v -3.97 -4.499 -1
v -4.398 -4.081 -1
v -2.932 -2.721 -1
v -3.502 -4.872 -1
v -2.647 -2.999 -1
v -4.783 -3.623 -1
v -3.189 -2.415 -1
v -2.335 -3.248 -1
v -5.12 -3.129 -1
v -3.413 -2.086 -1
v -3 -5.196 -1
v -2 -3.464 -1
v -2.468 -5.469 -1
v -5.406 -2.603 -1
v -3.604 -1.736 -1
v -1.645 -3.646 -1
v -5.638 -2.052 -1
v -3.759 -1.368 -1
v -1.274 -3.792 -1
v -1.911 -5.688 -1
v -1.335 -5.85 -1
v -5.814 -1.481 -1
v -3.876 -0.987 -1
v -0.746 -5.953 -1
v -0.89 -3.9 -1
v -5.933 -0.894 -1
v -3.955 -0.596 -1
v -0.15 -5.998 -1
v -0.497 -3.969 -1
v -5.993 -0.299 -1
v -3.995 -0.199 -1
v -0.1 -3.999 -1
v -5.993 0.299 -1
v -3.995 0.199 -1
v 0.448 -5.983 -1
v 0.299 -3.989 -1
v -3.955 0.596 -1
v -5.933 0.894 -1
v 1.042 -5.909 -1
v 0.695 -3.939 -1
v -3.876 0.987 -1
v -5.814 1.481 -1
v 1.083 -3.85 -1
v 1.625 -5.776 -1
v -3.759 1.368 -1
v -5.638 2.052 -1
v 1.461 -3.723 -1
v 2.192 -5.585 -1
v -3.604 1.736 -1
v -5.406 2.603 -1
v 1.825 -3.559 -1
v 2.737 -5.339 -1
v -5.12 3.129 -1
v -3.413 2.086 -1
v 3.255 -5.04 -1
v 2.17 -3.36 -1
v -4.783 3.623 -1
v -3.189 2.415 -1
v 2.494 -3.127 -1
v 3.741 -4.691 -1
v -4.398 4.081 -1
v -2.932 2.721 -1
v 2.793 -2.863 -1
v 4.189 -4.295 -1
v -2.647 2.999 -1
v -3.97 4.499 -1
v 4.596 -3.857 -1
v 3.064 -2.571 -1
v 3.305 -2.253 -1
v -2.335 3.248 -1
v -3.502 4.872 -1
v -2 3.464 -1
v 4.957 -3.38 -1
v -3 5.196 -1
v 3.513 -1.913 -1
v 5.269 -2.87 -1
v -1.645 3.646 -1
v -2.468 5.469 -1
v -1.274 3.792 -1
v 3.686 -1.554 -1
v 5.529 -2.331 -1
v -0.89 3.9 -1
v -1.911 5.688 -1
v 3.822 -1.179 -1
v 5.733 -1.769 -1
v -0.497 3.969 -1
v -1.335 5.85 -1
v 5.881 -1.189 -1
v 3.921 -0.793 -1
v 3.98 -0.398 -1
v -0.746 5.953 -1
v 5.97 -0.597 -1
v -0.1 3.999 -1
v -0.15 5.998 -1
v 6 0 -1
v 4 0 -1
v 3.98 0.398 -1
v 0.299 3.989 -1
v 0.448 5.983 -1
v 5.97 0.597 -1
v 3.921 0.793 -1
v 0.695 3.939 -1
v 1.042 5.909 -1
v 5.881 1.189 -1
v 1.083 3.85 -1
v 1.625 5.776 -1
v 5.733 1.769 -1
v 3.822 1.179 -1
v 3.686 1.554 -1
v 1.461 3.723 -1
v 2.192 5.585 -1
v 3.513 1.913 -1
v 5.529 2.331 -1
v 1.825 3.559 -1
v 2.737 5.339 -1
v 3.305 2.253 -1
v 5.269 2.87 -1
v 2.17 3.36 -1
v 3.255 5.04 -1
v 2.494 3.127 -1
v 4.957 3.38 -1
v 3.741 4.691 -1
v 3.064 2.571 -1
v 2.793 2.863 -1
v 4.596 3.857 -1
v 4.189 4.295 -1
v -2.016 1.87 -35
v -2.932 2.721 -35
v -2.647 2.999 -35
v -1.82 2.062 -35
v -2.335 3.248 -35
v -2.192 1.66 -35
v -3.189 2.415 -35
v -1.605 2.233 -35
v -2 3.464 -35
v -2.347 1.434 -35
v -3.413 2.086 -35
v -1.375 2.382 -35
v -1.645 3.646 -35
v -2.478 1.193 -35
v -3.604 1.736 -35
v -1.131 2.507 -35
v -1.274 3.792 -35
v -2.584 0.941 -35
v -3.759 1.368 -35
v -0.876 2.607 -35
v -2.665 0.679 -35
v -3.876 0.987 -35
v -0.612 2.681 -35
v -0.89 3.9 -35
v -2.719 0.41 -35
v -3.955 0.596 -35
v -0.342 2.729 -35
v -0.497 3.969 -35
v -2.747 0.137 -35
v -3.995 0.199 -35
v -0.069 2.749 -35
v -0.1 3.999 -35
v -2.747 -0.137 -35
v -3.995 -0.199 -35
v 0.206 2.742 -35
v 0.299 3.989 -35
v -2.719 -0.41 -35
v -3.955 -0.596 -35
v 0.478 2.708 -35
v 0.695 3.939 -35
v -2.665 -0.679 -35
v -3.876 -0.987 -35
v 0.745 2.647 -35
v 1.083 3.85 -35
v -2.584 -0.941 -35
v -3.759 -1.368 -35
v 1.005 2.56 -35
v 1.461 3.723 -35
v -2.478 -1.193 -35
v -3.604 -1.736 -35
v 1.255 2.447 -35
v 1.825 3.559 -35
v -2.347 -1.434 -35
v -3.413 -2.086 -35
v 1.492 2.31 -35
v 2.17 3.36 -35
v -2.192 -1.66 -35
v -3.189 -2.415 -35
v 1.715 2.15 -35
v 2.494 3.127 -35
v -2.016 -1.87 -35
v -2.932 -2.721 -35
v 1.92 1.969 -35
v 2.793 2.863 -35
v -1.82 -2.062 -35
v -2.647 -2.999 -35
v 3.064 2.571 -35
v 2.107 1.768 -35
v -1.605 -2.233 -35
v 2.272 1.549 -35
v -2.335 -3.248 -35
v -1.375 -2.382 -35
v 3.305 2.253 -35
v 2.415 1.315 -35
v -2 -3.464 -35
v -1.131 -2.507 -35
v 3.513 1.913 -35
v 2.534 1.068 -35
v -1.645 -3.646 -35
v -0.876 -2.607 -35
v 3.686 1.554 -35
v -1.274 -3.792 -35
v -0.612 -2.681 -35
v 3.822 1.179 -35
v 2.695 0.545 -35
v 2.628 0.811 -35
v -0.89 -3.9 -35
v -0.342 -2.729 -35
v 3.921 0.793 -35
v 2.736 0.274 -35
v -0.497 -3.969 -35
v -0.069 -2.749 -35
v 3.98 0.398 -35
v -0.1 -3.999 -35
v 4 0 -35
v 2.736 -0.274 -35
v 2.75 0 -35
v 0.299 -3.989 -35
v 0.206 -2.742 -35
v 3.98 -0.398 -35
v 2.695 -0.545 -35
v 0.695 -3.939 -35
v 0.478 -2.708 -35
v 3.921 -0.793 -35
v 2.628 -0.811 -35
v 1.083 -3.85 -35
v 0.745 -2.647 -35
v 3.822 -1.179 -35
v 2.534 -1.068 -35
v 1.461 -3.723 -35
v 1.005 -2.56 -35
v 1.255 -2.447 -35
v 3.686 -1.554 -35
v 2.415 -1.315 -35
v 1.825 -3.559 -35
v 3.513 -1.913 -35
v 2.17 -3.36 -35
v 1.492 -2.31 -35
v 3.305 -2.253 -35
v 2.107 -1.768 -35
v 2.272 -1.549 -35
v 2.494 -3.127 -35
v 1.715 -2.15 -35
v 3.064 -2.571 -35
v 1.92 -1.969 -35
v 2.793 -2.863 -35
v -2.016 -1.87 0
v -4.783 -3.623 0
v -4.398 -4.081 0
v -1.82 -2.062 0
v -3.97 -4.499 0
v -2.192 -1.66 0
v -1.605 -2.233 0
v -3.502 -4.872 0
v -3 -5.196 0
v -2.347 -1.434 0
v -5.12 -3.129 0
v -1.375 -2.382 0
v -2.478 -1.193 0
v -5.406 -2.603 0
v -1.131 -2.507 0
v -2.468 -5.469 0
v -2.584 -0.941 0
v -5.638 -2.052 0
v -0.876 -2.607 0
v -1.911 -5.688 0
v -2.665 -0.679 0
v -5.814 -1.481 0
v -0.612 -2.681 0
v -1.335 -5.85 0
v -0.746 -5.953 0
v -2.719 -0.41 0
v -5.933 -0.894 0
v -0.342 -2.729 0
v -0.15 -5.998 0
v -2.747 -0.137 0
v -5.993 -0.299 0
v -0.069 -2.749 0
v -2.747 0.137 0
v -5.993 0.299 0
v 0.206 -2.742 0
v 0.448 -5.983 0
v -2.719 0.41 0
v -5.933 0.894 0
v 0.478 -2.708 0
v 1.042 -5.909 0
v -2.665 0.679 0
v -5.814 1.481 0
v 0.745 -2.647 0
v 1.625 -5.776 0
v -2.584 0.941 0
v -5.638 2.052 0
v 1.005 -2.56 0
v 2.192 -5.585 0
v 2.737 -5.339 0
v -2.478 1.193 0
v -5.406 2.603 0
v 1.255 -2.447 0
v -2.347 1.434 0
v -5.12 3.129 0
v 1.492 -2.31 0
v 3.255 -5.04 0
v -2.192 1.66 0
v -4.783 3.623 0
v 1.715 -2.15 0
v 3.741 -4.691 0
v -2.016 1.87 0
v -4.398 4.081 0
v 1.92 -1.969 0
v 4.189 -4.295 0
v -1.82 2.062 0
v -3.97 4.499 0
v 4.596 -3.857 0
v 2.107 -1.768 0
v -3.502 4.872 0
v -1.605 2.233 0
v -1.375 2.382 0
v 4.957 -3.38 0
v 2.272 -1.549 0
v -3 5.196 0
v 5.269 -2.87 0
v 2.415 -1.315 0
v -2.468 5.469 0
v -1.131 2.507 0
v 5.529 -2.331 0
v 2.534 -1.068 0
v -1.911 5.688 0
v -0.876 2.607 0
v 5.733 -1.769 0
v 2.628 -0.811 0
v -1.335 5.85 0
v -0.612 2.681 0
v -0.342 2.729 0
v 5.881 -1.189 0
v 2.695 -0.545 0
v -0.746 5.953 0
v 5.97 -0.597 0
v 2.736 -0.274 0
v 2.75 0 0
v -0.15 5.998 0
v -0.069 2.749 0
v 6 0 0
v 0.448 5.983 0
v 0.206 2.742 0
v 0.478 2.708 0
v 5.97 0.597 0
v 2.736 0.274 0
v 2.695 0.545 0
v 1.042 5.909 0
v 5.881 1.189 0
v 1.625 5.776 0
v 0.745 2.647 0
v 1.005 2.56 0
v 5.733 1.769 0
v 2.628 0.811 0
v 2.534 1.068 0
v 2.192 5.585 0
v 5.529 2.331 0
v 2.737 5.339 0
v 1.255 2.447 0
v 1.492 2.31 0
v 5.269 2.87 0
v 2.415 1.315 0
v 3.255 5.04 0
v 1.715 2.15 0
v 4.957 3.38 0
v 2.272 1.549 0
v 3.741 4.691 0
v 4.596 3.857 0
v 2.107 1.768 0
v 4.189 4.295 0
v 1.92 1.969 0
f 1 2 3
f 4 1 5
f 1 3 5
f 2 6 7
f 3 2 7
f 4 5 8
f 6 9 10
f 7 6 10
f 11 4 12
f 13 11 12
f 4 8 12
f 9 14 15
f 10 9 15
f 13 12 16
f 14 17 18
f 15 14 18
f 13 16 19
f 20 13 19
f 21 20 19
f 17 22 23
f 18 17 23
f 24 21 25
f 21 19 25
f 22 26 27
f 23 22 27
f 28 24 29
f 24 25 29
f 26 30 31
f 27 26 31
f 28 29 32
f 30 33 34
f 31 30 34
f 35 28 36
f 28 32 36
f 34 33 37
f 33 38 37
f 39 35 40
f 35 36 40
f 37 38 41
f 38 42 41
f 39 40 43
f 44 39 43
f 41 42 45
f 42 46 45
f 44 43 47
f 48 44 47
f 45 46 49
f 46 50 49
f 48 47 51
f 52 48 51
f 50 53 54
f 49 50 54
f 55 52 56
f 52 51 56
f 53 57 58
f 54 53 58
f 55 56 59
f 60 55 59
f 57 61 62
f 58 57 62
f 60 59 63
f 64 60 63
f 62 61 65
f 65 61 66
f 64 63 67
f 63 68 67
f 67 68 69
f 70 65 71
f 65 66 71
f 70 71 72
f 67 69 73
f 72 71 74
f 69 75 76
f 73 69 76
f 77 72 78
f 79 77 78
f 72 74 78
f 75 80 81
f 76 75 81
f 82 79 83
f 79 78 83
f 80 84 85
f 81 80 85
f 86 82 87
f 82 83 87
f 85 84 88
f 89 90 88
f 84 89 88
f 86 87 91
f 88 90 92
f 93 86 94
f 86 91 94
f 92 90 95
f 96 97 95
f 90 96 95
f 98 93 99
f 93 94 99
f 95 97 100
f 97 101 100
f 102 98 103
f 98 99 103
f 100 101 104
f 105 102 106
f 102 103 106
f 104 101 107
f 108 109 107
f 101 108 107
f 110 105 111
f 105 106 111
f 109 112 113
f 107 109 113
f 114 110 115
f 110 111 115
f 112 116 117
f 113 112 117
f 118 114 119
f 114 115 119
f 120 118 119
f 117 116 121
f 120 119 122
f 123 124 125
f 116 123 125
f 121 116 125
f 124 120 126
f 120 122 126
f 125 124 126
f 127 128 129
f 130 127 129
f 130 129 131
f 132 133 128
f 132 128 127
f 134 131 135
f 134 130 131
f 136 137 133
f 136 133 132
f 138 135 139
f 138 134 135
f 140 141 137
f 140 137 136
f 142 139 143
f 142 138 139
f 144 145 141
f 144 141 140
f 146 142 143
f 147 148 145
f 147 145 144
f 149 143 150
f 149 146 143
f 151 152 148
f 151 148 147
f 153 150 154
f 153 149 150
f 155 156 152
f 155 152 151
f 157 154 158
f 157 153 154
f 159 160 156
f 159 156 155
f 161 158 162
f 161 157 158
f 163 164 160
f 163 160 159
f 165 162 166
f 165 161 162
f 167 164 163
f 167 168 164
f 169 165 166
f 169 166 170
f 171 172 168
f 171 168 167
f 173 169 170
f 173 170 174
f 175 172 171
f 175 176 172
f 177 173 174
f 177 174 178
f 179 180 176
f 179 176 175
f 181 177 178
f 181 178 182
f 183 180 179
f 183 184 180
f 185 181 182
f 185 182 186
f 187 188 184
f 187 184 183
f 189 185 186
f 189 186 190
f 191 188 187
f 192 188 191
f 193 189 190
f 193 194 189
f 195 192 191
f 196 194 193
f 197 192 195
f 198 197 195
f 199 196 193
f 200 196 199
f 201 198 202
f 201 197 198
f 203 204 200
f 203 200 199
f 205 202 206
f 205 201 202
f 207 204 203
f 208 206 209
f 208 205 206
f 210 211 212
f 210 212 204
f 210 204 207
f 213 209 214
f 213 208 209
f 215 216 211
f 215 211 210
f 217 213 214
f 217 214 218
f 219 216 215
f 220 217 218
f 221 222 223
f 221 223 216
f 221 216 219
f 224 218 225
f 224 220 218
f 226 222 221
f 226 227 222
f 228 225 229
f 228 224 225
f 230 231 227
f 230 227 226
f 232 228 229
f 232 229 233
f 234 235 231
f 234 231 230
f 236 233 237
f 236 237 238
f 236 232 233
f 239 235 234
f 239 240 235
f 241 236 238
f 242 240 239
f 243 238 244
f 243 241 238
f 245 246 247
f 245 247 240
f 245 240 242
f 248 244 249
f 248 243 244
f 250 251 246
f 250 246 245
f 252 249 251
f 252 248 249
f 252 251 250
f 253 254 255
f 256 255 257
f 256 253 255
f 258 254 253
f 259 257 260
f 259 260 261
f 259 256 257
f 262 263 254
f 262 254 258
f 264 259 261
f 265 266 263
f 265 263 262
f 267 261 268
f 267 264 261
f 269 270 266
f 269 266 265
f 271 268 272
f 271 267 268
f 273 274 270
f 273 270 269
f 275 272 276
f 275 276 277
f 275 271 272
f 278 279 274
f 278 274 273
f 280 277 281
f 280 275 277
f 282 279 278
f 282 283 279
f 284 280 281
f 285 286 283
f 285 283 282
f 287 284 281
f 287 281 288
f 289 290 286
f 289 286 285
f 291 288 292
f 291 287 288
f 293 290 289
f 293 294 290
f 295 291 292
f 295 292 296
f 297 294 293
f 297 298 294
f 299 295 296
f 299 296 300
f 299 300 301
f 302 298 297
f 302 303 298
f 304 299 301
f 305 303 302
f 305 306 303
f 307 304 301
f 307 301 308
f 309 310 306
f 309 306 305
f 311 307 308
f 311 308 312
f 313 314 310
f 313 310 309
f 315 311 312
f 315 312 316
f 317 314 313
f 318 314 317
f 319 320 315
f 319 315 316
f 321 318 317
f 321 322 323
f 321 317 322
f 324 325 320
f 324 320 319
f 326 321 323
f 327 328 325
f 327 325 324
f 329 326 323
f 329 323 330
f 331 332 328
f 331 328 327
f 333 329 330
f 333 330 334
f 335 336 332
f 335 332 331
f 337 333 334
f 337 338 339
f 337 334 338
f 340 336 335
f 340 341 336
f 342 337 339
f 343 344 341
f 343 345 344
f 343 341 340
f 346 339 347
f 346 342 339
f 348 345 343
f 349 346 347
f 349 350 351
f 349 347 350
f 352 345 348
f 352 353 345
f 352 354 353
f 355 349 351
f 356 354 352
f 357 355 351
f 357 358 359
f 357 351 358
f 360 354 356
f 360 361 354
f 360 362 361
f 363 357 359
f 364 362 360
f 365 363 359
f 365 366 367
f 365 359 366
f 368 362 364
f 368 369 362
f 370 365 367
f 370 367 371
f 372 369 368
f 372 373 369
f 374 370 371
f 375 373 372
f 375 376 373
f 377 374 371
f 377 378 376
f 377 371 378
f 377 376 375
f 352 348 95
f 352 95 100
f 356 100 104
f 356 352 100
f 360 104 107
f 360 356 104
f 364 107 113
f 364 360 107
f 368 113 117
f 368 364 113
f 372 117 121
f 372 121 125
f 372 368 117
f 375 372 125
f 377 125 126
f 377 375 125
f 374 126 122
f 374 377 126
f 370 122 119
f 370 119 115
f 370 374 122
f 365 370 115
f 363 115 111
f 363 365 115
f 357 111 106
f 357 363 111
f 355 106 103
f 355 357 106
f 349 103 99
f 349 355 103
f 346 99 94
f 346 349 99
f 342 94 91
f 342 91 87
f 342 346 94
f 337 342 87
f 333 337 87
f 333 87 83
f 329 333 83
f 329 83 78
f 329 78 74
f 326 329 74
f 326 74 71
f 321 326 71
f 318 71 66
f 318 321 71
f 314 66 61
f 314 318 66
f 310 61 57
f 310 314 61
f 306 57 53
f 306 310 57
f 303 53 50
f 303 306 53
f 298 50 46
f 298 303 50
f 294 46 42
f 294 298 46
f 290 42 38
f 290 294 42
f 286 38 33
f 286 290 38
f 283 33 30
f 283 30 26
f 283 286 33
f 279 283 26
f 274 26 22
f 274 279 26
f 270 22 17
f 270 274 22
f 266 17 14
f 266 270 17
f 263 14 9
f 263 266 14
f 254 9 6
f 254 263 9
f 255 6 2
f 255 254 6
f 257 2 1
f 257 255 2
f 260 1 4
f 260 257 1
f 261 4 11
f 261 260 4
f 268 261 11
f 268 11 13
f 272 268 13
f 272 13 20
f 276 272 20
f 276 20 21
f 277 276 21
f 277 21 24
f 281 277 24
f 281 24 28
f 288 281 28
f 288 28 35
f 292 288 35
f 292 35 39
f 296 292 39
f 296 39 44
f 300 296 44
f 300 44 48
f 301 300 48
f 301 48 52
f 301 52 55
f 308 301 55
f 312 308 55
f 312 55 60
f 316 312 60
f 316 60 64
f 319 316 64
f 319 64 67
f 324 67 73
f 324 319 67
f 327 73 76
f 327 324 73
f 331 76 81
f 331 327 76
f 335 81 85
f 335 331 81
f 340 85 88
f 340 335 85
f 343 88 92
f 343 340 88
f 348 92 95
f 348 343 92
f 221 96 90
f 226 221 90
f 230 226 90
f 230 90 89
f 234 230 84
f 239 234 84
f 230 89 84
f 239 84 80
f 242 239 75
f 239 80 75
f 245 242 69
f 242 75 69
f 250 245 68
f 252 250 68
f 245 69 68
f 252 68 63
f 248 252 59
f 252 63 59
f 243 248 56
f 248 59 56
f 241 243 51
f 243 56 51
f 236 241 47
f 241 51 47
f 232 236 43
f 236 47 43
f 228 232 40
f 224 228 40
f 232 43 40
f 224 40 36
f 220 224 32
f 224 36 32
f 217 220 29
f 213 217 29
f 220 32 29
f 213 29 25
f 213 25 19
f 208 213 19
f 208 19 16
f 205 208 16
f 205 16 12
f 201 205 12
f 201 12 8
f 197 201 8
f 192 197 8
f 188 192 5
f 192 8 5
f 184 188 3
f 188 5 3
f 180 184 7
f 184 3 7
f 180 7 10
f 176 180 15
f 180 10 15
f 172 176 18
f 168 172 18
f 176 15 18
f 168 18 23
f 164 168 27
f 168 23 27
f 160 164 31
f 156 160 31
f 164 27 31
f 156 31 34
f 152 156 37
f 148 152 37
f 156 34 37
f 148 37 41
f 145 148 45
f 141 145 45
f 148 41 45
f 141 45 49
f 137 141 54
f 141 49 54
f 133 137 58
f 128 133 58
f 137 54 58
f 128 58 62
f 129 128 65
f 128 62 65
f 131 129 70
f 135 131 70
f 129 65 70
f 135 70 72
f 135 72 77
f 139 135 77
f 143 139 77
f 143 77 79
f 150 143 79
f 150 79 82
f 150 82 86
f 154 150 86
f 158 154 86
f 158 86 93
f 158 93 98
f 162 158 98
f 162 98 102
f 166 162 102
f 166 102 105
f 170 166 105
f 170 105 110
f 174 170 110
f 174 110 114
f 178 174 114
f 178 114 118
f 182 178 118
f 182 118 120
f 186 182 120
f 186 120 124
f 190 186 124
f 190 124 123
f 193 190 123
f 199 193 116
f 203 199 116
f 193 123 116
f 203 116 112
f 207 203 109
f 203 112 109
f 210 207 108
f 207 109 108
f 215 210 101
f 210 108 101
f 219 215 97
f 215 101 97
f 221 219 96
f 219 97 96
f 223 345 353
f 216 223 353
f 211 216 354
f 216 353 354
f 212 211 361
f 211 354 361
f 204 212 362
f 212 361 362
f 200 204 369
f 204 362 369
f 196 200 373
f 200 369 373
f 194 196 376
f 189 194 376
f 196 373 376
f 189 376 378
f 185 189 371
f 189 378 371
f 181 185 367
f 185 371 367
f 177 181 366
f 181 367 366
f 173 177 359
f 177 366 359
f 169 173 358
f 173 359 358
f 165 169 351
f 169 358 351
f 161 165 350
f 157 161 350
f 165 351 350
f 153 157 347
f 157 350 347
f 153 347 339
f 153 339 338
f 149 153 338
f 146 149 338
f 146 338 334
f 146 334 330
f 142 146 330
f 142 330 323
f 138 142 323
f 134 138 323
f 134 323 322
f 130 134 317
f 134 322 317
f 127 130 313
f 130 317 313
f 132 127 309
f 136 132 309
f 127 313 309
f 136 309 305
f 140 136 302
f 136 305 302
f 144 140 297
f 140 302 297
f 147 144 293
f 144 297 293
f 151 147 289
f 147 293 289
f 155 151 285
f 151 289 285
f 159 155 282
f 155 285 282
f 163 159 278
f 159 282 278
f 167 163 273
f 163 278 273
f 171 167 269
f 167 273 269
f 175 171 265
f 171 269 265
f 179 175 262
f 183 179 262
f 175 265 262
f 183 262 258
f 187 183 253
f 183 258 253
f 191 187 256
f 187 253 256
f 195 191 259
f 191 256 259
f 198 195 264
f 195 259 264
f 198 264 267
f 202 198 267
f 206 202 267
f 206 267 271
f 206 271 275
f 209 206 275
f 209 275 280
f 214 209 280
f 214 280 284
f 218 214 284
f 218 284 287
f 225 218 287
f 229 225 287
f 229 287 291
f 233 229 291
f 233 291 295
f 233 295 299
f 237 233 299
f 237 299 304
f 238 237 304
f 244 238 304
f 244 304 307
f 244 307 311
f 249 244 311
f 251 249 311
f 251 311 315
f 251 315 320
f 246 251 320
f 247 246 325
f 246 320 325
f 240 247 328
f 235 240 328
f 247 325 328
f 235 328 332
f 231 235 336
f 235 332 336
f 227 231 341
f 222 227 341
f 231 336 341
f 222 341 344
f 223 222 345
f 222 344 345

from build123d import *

# Parameters (mm, degrees)
F0_R     = 6
F1_DEPTH = 1
F2_R     = 4
F3_DEPTH = 34
F4_R     = 2.75
F5_DEPTH = 35


with BuildPart() as f1:
    # F0 (on Top) → F1 (new body)
    with BuildSketch(Plane.XY):
        Circle(F0_R)
    extrude(amount=-F1_DEPTH)

    # F2 (on face) → F3 (join)
    with BuildSketch(Plane(origin=(0, 0, -1), x_dir=(1, 0, 0), z_dir=(0, 0, -1))):
        Circle(F2_R)
    extrude(amount=F3_DEPTH)

    # F4 (on face) → F5 (cut)
    with BuildSketch(Plane.XY):
        Circle(F4_R)
    extrude(amount=-F5_DEPTH, mode=Mode.SUBTRACT)


solid = f1.part
